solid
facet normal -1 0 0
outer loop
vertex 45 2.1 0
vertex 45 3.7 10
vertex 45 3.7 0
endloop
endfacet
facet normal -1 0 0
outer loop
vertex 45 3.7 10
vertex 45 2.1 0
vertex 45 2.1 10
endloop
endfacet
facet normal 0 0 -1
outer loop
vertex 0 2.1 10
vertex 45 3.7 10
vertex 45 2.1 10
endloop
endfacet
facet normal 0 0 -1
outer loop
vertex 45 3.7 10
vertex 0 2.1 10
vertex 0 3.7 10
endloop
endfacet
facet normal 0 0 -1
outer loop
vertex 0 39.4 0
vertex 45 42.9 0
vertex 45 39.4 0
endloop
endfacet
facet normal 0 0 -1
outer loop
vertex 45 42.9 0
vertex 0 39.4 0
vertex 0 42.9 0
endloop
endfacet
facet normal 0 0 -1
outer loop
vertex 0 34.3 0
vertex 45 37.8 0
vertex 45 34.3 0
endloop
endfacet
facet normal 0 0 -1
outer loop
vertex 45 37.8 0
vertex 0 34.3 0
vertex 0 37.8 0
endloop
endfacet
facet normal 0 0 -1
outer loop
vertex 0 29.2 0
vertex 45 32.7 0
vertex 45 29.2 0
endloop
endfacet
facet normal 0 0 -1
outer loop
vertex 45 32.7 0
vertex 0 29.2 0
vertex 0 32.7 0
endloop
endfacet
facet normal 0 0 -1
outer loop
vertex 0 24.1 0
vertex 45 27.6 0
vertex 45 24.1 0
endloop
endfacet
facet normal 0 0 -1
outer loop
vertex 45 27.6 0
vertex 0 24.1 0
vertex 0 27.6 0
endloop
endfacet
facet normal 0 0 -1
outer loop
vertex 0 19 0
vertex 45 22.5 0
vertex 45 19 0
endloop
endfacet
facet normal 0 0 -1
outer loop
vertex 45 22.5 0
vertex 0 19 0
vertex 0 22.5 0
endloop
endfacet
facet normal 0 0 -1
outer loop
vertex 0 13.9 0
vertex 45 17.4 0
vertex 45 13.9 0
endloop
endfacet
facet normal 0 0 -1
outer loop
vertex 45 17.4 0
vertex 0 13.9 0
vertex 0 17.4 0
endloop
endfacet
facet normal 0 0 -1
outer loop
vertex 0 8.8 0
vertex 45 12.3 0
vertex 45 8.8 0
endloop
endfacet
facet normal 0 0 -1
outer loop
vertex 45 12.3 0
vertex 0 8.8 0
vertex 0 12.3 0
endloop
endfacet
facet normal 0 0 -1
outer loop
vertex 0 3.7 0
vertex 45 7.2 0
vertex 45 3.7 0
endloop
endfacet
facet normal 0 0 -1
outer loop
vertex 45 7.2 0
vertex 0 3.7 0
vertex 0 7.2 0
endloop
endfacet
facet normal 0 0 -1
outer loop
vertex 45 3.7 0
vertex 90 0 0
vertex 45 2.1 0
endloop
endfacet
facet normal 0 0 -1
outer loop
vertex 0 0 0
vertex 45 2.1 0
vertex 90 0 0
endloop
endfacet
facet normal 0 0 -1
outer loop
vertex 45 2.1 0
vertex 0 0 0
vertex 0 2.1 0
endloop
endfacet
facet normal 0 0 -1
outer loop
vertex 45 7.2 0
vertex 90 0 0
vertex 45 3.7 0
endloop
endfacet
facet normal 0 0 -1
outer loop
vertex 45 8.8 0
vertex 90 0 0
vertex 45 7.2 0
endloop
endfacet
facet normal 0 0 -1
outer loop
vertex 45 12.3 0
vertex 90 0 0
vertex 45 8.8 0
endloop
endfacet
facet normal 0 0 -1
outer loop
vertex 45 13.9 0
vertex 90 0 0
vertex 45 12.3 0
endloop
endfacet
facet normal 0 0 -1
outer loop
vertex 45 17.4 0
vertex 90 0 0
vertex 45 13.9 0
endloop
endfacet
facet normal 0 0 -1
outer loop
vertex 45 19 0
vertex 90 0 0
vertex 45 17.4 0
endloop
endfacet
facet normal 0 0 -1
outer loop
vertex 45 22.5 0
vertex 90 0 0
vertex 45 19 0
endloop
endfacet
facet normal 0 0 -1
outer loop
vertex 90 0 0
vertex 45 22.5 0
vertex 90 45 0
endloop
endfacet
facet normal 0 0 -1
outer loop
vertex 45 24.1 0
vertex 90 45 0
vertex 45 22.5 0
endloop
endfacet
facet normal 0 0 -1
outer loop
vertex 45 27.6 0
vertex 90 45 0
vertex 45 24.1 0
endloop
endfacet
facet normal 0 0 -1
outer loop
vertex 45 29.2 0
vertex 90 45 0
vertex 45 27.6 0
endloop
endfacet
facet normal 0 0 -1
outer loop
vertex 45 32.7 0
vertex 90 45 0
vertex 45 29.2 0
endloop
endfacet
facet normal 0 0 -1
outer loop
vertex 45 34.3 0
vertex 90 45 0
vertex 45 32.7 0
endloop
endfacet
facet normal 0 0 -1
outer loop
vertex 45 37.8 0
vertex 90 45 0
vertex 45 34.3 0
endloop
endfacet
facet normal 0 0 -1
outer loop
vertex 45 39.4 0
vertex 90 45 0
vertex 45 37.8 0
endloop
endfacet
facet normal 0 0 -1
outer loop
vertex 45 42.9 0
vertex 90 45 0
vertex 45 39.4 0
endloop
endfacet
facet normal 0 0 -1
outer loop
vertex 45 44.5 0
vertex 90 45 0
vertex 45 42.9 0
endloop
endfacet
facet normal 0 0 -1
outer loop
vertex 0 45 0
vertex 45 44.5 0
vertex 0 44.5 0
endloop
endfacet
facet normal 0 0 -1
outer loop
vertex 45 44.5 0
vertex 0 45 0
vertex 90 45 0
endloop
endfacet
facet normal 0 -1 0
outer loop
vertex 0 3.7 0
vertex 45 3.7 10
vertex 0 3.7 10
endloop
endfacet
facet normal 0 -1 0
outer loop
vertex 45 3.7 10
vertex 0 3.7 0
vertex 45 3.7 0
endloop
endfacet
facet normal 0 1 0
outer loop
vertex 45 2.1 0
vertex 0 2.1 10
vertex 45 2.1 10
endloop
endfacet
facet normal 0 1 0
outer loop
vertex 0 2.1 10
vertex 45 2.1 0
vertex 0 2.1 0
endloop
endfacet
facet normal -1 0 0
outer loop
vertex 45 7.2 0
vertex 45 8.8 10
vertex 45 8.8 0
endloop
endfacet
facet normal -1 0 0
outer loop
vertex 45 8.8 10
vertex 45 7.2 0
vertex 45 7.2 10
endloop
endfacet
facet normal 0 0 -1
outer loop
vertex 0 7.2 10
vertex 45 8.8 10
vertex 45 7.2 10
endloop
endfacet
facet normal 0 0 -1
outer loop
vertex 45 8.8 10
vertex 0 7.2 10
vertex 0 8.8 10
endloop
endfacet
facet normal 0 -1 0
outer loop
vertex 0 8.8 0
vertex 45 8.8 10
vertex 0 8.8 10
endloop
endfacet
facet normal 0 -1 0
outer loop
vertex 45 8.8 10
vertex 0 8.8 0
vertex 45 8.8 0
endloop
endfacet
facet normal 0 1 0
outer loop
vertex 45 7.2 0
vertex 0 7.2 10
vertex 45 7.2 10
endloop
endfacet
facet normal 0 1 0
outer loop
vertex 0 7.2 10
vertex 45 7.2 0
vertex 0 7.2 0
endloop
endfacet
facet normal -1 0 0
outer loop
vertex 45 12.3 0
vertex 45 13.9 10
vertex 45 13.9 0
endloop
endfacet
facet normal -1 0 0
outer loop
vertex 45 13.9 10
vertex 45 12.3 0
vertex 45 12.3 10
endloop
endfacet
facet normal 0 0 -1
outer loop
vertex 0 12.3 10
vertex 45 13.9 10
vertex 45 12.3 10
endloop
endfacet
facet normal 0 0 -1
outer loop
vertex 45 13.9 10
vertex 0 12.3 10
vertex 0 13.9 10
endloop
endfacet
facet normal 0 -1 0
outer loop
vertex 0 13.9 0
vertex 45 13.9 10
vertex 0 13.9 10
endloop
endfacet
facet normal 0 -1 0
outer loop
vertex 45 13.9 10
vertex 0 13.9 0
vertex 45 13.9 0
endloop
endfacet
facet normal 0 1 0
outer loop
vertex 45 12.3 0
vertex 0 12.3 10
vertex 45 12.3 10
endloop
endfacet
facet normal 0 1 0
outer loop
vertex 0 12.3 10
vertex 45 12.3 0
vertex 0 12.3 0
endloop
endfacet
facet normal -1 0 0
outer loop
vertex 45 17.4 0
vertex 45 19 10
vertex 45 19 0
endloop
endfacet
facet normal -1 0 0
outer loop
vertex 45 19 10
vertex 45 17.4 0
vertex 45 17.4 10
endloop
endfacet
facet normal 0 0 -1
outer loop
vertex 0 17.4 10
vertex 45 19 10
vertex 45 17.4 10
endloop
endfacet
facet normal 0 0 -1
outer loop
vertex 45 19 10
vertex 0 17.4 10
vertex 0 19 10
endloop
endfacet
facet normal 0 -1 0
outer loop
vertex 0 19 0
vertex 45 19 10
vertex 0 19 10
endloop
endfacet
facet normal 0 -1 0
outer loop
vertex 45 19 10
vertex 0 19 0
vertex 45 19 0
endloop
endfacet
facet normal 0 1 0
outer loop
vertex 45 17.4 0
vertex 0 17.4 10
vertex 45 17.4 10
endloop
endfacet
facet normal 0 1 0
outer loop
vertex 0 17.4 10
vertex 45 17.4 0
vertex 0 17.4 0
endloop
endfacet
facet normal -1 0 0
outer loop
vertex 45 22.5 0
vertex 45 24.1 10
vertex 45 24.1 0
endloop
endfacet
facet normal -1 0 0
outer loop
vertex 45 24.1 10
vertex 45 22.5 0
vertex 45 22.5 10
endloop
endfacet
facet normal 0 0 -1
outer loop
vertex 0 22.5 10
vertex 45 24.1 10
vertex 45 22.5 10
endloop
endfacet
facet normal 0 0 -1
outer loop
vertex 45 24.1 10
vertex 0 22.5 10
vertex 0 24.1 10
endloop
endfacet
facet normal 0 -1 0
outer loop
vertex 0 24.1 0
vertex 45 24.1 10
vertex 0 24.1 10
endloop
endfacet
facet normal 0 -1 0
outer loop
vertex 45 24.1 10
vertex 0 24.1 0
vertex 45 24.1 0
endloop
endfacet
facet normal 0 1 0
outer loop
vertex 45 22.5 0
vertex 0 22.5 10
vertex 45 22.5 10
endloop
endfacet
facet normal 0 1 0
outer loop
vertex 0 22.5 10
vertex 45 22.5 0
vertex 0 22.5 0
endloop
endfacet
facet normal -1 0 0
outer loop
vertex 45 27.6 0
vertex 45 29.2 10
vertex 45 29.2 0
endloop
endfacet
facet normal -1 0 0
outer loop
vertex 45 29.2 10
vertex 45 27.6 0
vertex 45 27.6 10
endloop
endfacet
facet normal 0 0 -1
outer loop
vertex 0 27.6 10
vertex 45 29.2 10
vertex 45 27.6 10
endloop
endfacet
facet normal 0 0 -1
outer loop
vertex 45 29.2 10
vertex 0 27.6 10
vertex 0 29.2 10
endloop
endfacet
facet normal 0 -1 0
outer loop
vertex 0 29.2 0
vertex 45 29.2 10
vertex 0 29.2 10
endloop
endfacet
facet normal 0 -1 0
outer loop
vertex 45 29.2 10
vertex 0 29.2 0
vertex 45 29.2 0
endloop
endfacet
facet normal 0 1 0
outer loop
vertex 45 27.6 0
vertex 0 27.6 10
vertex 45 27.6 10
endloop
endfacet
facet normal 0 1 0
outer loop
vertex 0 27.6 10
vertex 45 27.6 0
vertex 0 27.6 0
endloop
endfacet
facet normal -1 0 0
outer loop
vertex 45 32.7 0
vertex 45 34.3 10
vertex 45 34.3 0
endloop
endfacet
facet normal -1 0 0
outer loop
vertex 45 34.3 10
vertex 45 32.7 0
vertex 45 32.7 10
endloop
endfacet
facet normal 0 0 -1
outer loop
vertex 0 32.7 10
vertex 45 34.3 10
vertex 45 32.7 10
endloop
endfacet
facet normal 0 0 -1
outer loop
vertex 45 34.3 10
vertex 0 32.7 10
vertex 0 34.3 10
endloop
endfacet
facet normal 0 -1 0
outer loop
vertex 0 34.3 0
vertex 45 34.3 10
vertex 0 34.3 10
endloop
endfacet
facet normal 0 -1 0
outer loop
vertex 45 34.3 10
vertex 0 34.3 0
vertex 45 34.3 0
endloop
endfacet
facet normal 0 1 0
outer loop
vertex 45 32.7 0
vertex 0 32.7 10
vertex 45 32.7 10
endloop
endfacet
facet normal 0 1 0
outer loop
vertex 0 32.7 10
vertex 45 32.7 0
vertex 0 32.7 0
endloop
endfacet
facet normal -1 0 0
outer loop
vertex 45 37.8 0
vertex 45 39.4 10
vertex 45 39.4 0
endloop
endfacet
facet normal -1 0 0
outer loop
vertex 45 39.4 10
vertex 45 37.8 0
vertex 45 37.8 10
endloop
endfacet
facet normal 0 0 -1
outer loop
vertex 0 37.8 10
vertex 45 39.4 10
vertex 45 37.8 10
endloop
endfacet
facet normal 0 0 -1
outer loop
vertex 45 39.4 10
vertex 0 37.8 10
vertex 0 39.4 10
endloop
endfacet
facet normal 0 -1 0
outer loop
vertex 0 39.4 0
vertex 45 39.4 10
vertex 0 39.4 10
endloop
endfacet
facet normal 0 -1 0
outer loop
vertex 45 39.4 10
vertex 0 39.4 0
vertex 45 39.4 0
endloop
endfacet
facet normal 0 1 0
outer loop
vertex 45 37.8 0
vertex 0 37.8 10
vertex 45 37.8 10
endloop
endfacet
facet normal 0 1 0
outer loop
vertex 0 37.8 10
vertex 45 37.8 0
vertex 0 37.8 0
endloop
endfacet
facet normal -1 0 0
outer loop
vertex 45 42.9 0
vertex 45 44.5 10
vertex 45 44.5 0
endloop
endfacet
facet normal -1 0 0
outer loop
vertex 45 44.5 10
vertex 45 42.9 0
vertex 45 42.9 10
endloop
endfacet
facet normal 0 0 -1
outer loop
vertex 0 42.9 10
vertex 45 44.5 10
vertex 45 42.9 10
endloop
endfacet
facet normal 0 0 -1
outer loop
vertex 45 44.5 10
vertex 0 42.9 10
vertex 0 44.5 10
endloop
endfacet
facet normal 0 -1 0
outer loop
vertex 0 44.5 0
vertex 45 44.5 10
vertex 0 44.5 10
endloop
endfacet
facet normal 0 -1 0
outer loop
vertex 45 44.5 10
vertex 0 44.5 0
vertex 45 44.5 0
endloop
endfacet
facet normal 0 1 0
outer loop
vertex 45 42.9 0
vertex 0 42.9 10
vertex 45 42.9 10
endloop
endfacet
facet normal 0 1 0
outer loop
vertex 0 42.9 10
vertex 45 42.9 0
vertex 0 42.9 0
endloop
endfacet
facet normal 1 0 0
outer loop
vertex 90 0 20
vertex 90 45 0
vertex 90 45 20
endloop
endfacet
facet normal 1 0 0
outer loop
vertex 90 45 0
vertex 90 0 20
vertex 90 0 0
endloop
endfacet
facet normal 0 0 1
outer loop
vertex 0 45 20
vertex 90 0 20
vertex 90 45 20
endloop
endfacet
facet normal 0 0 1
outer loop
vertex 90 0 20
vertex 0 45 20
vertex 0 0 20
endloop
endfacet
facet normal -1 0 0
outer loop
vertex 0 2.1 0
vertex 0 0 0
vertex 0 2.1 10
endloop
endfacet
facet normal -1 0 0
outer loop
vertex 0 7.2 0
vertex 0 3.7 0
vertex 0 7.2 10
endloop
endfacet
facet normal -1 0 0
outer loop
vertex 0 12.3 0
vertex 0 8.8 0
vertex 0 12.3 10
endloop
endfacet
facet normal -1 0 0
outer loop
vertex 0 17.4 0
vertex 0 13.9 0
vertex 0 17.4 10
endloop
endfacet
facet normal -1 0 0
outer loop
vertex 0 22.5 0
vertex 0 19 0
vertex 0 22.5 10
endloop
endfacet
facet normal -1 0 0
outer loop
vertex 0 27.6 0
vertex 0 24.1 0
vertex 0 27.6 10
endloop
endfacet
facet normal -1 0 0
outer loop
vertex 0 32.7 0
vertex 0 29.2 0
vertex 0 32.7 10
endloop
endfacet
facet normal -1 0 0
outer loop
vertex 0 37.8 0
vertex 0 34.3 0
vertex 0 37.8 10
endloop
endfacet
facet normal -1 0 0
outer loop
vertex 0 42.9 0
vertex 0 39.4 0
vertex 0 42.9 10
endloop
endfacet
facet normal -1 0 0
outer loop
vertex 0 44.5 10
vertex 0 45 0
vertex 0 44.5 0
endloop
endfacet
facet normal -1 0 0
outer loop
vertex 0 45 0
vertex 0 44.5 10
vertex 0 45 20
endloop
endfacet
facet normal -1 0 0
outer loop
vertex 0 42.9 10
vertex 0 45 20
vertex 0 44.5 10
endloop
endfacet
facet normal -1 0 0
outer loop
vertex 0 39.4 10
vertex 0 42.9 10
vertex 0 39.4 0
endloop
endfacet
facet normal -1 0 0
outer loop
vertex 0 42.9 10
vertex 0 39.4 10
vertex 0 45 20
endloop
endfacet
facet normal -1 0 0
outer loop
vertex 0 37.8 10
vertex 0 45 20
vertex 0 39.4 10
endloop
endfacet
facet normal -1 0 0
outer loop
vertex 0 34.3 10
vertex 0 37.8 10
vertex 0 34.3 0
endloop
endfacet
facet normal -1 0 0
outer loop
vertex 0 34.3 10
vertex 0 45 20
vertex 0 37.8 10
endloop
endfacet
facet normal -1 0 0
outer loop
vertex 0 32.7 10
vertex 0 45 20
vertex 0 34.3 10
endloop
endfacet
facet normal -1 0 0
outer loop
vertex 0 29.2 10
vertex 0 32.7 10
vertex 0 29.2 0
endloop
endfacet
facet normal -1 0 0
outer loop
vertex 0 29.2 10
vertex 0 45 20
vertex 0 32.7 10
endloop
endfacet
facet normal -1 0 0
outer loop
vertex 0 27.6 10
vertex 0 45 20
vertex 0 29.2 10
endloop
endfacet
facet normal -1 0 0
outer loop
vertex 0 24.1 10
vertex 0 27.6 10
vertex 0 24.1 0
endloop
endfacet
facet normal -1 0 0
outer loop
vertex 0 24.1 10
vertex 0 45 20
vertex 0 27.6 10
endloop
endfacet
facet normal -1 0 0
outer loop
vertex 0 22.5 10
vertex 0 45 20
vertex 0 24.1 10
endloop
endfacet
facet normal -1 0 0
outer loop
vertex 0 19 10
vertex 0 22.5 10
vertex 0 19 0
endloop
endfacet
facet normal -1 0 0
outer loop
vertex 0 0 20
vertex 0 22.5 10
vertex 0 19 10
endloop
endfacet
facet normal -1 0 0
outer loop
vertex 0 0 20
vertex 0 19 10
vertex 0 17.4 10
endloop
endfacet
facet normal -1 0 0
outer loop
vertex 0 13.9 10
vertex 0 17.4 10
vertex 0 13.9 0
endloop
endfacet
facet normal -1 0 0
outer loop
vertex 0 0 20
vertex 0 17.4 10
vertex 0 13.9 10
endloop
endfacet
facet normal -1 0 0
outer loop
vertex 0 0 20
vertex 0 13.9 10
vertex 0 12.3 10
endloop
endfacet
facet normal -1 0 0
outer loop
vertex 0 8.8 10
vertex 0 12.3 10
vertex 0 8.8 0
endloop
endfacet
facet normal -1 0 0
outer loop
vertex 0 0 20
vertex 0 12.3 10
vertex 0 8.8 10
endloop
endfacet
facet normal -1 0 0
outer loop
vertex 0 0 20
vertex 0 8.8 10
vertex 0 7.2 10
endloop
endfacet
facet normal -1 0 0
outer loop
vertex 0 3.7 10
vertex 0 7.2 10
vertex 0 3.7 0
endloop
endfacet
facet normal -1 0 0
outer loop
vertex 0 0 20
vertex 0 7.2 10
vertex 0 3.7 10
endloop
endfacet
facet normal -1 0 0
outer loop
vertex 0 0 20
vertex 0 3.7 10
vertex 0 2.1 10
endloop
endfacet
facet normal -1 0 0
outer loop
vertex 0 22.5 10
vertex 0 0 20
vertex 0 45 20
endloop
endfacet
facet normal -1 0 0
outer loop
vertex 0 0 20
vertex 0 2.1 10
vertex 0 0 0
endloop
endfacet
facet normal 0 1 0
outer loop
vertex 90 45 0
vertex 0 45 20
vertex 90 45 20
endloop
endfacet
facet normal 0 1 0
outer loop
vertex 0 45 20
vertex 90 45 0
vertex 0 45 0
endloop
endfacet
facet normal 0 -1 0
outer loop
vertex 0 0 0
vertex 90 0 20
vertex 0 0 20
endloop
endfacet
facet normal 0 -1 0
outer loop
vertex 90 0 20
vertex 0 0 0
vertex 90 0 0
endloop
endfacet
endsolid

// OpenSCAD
// Slide drying rack - a solid base block with a row of parallel slots standing up on their long
// edge, for drying 10 x 75 mm microscope slides. NOVEL general part.
//

slides = 10;
base_l = 90;
base_w = 45;
base_h = 20;
slot_l = 77;
slot_w = 1.6;
slot_d = 10;
pitch   = 3.5;

$fn = 48;

slot_x = (base_l - 2 * slot_l) / 2;
pitch_w = slot_w + pitch;
start_y = (base_w - slides * pitch_w) / 2;

difference() {
    cube([base_l, base_w, base_h]);
    for (i = [0 : slides - 1])
        translate([slot_x, start_y + i * pitch_w, 0]) cube([slot_l, slot_w, base_h - slot_d]);
}
